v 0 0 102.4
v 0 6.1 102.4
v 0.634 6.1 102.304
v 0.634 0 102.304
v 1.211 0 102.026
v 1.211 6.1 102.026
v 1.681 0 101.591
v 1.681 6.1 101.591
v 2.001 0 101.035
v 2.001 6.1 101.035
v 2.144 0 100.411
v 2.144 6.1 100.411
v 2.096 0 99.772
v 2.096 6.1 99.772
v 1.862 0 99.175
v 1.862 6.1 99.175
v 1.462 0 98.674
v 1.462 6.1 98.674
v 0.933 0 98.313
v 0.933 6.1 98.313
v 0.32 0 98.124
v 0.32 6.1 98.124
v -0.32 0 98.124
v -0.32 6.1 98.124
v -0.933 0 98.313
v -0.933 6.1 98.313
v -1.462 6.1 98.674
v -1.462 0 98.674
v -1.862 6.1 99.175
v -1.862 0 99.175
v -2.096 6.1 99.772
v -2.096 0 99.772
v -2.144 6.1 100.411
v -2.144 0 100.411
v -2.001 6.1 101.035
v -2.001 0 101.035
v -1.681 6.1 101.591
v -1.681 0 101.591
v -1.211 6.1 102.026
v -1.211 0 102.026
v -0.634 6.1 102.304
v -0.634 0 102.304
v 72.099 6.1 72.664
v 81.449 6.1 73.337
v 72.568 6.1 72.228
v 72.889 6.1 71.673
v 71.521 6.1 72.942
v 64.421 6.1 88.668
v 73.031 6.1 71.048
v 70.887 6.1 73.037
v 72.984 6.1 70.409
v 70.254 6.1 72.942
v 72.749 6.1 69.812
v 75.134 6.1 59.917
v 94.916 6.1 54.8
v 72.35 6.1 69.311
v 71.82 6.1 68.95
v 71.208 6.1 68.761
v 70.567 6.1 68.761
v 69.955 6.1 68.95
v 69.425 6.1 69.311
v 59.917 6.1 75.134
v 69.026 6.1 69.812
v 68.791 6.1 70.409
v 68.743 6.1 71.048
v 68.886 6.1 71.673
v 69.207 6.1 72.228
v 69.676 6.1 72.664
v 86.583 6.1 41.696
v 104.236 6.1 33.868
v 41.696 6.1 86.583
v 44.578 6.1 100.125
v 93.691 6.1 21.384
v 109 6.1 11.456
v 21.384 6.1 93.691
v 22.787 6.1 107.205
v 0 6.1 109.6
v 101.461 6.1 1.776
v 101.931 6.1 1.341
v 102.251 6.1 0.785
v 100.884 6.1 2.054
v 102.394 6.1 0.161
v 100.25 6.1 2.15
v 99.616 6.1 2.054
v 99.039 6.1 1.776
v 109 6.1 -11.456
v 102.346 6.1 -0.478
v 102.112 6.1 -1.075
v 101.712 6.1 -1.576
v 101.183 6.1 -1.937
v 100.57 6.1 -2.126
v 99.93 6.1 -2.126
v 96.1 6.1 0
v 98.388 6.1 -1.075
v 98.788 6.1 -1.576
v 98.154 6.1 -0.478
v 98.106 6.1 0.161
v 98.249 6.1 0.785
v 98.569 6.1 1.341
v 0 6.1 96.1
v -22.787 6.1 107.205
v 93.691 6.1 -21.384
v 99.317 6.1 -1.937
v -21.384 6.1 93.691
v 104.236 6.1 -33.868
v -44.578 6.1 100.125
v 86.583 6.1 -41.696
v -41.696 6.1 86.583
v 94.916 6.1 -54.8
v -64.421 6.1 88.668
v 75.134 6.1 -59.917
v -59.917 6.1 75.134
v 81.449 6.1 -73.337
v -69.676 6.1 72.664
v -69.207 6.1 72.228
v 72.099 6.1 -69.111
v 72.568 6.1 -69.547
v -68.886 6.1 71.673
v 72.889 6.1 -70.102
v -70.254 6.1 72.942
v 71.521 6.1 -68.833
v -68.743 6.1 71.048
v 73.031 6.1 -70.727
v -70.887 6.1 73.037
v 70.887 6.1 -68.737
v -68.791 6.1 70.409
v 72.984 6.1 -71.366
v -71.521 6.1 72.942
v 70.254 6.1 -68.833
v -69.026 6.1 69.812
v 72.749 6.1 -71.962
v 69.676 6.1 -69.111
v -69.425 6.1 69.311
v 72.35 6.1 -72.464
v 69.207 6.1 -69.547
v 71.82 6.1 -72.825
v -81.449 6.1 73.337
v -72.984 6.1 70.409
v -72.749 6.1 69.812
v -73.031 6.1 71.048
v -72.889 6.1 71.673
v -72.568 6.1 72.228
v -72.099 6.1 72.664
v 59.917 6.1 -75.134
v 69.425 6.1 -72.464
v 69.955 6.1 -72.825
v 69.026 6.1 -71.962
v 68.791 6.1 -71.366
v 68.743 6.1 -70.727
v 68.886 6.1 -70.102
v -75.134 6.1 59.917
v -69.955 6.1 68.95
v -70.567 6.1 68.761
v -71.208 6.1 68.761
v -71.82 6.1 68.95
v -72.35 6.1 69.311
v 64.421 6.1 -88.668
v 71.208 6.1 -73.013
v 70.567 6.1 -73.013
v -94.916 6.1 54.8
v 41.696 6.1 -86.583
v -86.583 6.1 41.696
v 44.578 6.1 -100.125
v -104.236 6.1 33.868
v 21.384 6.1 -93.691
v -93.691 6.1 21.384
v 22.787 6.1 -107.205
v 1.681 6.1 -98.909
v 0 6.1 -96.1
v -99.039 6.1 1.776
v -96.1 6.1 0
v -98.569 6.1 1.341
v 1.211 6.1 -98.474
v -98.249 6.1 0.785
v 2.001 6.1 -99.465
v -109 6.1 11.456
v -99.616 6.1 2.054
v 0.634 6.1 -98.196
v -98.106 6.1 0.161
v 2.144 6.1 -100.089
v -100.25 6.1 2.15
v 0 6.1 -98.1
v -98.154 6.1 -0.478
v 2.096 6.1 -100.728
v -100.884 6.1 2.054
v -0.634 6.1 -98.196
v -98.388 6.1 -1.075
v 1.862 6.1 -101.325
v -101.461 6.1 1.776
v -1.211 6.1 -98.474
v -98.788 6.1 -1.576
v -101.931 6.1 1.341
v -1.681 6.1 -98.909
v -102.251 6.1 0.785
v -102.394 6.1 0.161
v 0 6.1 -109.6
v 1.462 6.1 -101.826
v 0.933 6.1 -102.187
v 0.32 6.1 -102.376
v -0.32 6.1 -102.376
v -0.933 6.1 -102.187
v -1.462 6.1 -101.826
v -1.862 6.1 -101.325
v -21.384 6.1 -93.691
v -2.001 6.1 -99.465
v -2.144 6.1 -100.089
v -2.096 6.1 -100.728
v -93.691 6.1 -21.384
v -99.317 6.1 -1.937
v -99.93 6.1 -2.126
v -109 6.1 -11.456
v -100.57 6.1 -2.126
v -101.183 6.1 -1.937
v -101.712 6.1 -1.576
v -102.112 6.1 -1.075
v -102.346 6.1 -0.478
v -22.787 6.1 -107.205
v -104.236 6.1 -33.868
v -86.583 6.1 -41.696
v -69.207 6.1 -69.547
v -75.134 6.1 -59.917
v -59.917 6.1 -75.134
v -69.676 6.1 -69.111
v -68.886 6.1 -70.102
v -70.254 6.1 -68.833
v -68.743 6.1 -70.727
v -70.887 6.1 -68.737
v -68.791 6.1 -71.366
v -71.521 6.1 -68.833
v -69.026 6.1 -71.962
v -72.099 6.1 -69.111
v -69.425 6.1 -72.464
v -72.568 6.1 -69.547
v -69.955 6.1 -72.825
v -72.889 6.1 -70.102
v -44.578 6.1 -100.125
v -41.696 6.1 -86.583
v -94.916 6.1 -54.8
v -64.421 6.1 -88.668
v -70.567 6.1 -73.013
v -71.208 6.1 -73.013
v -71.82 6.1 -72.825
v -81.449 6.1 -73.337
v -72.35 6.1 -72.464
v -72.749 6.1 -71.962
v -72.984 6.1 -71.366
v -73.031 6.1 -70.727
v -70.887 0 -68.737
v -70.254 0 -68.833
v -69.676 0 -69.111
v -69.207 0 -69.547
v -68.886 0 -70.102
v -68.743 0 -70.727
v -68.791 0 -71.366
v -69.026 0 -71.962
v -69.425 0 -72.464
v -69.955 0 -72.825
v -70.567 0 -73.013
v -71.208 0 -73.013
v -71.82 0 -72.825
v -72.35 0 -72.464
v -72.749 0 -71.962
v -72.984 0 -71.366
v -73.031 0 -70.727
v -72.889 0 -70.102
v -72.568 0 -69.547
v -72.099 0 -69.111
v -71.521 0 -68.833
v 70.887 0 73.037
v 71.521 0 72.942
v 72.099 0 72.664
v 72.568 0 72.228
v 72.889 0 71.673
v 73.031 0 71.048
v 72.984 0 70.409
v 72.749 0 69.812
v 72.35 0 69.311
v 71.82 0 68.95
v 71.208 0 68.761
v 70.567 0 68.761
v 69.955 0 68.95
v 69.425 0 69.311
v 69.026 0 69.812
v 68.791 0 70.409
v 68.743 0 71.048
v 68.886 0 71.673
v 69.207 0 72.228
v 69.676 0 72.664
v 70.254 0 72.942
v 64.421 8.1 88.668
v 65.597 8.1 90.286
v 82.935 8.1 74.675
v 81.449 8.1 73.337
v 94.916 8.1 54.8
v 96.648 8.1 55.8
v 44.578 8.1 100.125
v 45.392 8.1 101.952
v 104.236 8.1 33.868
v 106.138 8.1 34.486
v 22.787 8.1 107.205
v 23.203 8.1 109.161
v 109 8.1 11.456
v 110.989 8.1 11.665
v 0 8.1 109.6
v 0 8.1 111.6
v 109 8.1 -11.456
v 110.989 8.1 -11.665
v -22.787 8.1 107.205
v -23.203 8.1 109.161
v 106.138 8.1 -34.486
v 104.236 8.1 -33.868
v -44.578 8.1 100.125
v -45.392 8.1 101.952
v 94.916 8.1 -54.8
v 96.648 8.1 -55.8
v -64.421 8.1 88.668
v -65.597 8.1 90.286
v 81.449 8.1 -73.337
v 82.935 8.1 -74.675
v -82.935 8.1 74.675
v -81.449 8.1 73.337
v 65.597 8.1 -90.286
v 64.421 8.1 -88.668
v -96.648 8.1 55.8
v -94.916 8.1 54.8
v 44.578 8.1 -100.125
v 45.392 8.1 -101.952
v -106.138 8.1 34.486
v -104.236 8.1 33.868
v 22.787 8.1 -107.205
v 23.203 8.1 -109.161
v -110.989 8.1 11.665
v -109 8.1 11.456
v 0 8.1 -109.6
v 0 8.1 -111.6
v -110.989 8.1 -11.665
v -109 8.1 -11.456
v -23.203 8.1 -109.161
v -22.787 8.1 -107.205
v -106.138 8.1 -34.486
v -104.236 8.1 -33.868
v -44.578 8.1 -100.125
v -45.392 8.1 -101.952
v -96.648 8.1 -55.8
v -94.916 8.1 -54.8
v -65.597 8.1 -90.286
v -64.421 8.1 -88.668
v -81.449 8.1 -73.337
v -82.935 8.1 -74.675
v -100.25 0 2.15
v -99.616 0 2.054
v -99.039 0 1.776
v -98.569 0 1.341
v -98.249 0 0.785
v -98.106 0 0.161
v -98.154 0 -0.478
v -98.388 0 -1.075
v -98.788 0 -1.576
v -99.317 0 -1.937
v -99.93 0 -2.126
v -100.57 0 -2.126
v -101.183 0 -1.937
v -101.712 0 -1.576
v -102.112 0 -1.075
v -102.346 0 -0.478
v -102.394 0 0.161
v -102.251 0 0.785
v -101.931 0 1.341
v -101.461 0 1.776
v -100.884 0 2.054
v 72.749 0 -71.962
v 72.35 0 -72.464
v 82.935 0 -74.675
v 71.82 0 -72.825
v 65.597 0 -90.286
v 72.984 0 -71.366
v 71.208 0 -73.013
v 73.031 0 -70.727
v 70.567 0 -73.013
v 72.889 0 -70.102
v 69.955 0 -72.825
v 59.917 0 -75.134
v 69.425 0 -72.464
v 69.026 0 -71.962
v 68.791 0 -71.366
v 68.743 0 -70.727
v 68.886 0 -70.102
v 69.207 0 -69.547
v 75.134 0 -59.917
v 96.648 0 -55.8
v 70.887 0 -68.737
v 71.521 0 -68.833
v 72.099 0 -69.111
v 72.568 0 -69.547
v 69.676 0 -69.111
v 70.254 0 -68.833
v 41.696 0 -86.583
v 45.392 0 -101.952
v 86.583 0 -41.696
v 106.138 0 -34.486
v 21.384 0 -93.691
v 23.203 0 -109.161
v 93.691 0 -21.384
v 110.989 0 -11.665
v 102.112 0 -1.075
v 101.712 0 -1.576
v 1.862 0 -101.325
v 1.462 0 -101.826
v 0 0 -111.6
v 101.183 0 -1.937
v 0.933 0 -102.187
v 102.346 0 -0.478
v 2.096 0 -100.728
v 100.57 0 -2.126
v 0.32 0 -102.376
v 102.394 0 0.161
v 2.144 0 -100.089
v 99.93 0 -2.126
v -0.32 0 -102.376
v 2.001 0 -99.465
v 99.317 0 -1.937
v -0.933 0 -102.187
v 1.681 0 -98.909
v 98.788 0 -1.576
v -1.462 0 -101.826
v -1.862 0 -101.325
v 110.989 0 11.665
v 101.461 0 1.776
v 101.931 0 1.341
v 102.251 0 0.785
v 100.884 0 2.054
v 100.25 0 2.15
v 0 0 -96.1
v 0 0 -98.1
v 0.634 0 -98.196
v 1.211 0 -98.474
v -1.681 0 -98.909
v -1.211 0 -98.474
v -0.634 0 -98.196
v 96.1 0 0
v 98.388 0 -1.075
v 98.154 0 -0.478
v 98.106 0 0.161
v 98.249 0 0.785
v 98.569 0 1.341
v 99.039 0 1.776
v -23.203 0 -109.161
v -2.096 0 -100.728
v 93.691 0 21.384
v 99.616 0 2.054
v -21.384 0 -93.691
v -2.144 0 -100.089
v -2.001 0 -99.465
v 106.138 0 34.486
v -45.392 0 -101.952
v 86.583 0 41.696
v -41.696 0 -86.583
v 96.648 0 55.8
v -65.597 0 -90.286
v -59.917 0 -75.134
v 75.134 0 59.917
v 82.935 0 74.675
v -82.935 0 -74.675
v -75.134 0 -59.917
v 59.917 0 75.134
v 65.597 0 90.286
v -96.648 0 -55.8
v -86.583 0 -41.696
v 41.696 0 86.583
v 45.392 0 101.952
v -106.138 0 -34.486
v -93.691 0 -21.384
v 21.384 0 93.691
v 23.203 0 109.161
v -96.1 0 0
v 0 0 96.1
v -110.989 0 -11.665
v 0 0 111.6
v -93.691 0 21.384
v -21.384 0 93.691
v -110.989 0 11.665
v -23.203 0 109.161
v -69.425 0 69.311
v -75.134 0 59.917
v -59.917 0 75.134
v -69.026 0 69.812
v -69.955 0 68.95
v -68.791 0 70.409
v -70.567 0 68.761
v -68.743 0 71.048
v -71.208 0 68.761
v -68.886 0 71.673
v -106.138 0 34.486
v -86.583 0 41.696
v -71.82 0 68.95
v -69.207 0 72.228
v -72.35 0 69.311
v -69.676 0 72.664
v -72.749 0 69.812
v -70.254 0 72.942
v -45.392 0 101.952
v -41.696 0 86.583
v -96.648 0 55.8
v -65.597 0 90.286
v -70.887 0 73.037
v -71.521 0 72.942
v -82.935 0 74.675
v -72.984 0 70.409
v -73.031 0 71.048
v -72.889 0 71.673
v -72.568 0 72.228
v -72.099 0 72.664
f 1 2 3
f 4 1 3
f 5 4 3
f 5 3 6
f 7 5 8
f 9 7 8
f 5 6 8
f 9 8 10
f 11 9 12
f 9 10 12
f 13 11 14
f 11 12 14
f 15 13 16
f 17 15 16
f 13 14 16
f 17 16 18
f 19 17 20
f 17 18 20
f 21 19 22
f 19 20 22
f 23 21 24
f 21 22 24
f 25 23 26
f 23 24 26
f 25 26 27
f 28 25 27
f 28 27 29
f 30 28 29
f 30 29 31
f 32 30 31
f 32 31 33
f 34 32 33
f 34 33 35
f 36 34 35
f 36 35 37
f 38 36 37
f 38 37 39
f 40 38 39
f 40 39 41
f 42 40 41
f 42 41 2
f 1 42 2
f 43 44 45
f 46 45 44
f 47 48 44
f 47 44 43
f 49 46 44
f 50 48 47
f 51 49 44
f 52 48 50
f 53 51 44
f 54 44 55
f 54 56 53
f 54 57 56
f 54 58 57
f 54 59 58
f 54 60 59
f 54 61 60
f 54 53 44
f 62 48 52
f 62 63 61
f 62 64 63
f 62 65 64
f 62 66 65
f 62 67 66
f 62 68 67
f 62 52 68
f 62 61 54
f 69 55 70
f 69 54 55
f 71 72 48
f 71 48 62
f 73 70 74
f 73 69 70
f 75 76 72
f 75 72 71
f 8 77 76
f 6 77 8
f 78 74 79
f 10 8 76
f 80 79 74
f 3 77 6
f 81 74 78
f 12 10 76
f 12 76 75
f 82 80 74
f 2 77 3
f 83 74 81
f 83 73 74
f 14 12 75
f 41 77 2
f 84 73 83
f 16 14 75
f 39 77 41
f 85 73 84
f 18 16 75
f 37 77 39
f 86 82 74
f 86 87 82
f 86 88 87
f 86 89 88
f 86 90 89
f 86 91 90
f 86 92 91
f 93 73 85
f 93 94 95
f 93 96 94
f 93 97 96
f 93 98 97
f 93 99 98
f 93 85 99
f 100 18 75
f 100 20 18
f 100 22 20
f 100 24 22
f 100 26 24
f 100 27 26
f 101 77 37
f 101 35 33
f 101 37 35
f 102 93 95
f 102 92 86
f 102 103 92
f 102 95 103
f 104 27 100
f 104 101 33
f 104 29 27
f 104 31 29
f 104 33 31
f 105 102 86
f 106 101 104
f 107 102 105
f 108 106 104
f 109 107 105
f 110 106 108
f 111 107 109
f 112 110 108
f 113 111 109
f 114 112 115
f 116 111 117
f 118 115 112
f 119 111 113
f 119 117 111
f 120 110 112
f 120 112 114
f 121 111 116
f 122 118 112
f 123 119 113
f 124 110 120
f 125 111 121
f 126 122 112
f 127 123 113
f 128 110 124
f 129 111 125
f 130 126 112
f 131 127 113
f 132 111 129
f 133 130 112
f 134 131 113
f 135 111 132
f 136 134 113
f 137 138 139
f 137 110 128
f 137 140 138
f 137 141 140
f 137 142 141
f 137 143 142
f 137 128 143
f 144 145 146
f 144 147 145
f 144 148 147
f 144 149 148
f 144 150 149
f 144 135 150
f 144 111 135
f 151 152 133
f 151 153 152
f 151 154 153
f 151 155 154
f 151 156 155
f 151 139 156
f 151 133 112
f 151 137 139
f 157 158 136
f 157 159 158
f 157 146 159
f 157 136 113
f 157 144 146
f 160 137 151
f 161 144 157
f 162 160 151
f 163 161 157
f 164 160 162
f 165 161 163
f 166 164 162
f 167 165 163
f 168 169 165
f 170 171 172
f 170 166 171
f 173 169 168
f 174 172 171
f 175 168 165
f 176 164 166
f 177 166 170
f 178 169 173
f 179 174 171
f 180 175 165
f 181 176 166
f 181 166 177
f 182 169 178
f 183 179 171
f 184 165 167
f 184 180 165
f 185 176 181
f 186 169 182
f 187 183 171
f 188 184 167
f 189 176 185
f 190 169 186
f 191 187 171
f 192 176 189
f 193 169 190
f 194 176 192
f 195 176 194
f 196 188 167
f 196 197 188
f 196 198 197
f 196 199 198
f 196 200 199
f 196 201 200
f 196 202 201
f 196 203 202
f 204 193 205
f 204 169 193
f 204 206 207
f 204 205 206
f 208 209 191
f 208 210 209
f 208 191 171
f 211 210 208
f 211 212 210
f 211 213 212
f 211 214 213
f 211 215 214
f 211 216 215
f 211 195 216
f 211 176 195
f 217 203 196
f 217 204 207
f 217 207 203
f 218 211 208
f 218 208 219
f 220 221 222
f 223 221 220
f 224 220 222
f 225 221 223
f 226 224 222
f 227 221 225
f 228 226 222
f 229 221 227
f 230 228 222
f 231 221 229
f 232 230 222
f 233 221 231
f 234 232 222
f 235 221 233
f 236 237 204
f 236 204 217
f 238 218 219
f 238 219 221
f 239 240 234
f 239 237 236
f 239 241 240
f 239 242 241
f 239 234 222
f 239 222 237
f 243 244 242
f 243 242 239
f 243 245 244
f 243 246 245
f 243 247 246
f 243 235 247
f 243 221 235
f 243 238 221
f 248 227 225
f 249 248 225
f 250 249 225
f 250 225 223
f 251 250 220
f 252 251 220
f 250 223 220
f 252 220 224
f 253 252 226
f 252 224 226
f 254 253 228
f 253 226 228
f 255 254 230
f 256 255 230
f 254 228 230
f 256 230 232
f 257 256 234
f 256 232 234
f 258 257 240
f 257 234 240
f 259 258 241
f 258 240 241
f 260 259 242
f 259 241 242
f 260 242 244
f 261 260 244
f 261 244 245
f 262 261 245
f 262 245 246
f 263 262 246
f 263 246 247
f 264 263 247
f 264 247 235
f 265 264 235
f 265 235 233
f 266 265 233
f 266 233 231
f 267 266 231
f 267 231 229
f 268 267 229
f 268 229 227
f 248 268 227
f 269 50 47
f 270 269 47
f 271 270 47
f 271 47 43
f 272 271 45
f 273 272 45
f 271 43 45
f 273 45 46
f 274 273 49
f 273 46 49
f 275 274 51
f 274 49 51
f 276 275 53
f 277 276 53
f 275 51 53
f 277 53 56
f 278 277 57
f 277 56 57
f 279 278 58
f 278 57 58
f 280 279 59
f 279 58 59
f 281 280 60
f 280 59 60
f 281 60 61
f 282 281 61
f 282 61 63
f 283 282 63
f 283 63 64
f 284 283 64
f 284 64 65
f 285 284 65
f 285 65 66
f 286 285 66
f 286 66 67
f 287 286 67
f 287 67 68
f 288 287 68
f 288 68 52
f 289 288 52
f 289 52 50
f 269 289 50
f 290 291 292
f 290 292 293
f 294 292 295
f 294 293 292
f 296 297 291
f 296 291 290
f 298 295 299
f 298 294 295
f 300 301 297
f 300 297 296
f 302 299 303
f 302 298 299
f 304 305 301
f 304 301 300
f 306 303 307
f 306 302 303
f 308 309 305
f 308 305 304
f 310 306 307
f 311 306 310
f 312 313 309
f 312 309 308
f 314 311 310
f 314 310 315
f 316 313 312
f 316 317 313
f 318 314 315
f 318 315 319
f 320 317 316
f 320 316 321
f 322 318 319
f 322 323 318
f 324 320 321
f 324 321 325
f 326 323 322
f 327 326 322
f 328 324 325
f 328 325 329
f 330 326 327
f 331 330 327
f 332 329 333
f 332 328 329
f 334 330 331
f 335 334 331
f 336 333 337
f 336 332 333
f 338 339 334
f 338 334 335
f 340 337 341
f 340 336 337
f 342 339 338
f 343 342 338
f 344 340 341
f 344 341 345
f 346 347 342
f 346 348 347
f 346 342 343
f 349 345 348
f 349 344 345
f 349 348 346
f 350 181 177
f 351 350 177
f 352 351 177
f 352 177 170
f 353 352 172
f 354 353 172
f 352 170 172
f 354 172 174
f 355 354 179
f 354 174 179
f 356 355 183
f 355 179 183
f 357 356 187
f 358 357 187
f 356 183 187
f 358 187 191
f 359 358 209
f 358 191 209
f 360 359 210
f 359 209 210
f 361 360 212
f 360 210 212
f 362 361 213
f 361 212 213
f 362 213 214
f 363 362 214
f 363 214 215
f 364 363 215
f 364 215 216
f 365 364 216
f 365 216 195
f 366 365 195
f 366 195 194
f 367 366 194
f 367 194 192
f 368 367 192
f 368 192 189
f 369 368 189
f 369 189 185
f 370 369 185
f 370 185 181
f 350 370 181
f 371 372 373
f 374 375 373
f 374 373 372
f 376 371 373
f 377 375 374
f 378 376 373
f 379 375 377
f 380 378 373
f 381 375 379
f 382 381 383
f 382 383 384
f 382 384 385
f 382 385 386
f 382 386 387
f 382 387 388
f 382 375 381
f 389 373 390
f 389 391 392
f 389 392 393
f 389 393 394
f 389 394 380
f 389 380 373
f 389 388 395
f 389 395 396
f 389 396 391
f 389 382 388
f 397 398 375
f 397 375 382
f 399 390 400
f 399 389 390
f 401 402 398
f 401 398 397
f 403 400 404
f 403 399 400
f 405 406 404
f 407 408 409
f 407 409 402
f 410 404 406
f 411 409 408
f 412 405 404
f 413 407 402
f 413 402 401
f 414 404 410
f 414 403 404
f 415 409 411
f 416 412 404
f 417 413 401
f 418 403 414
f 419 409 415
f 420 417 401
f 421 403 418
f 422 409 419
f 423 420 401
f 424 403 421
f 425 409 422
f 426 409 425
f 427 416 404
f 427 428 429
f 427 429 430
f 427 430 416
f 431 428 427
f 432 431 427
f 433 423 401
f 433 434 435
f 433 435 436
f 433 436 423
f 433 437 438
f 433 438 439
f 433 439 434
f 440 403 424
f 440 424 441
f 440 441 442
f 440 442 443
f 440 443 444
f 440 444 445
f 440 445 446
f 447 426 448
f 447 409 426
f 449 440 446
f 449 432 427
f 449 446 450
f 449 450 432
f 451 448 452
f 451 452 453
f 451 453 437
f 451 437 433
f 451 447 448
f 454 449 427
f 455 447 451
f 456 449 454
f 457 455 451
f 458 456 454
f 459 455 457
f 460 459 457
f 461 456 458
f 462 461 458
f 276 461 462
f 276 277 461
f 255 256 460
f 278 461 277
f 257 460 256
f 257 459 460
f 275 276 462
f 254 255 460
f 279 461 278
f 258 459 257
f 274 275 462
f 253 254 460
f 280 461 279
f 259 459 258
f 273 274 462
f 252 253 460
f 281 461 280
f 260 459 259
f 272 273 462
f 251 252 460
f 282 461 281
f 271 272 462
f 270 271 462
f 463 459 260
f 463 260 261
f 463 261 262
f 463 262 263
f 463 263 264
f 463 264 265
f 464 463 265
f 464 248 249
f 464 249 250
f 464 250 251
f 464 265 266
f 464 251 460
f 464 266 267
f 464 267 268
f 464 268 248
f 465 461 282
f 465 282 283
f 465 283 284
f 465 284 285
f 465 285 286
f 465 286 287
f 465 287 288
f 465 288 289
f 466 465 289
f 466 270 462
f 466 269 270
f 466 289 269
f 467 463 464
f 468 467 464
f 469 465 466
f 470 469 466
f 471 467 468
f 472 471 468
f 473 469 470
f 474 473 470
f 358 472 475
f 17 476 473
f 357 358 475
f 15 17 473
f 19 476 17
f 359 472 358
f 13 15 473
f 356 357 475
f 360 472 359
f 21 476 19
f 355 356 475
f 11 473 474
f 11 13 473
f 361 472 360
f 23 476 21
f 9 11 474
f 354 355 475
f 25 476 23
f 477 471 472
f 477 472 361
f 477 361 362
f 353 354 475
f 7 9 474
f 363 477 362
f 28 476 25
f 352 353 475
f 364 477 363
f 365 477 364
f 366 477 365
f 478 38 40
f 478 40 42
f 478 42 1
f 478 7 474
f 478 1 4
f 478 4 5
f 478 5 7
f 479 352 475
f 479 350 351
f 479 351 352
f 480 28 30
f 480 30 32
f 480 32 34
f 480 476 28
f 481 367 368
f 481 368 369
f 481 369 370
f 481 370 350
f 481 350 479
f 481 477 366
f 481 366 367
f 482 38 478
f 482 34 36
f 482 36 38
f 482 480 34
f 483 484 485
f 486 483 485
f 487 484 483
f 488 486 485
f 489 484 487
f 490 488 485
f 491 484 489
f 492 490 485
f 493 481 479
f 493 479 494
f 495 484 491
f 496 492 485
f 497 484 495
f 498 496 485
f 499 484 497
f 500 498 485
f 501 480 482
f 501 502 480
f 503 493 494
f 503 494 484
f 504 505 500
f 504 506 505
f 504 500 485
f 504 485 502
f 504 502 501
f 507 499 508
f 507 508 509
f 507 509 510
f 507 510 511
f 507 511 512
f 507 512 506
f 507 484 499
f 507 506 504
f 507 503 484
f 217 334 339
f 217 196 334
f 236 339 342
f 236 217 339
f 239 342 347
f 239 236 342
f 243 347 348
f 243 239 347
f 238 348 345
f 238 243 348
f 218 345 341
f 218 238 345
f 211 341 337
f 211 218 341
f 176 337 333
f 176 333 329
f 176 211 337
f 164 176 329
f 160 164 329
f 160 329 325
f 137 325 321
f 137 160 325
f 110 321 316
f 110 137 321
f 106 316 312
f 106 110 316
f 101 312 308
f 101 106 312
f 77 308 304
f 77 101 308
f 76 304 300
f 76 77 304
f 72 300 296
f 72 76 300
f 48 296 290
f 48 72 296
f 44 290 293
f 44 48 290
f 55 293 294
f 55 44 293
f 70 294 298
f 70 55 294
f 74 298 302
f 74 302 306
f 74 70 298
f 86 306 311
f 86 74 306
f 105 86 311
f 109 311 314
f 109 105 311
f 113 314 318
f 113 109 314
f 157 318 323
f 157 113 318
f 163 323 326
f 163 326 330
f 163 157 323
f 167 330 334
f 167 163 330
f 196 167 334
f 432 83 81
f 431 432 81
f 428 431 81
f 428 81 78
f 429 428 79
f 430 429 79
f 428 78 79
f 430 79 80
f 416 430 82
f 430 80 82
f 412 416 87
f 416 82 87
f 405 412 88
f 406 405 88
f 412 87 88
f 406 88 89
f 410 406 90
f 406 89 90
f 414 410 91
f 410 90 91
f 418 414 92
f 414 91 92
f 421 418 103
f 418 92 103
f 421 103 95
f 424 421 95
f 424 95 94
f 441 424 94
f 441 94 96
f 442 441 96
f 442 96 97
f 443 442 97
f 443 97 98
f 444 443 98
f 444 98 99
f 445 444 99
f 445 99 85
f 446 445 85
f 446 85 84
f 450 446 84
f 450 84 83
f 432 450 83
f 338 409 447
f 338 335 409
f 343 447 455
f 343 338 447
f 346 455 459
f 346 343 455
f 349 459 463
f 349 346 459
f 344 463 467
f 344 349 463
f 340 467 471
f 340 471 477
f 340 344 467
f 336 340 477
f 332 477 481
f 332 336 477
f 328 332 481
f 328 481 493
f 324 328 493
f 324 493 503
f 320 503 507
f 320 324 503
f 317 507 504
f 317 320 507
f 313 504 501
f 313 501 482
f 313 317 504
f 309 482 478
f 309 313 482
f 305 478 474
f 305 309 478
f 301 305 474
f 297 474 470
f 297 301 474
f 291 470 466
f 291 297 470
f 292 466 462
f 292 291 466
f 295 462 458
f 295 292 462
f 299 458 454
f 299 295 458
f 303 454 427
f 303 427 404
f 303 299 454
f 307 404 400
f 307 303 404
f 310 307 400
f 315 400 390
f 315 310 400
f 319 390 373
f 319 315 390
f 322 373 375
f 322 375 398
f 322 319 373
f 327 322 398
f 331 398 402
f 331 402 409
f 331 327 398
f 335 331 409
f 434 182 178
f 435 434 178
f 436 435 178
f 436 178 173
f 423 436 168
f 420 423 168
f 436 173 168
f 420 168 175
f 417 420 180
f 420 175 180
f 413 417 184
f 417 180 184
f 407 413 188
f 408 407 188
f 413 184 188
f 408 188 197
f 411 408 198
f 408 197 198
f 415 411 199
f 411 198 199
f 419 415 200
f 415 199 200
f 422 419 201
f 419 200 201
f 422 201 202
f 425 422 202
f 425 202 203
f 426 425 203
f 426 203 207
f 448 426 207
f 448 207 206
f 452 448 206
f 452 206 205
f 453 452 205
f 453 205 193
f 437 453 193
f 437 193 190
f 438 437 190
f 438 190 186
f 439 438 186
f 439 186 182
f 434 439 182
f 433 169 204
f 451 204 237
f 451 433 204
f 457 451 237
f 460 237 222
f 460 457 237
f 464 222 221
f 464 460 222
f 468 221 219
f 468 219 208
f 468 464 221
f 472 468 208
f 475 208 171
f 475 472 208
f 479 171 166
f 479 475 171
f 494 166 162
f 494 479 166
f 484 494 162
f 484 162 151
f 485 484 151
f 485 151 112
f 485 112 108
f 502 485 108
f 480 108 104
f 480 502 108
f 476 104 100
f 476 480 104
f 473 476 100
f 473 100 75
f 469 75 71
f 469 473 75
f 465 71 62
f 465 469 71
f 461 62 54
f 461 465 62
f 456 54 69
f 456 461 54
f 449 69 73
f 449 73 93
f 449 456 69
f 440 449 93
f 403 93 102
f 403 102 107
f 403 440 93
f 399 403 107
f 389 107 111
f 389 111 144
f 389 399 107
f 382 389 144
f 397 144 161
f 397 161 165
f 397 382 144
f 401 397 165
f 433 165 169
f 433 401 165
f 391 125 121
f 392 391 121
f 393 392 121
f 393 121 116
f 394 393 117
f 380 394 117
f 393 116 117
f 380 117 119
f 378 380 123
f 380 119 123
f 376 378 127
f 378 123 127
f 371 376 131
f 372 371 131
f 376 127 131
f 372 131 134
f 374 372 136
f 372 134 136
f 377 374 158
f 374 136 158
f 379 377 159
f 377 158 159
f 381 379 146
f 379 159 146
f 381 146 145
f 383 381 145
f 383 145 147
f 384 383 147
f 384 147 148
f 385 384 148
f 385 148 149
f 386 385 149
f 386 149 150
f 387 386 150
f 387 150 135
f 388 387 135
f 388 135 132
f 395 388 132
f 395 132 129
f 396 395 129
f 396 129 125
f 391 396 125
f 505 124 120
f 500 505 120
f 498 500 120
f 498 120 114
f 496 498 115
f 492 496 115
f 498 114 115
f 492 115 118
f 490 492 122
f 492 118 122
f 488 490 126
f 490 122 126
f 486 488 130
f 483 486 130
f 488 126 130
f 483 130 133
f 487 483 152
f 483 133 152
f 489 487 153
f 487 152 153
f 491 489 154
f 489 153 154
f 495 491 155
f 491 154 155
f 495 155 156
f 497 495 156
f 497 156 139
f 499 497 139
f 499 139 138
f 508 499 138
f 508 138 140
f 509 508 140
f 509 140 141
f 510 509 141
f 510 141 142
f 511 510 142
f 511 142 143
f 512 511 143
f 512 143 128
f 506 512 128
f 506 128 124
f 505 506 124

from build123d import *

# Parameters (mm, degrees)
CUT_EXTRUDE_1_REACH = 159.944
SKETCH_2_R          = 2.15


with BuildPart() as part:
    # 草图1 → 旋转1 (revolve)
    with BuildSketch(Plane.XY, mode=Mode.PRIVATE) as revolve_1_sk:
        Polygon((111.6, 6.1), (111.6, 8.1), (109.6, 8.1), (109.6, 6.1), (96.1, 6.1), (96.1, 0), (111.6, 0), align=None)
    revolve(revolve_1_sk.sketch.rotate(Axis((0, 0, 0), (0, 1, 0)), 90), axis=Axis((0, 0, 0), (0, 1, 0)))

    # 草图2 → 切除-拉伸1 (cut, up to next)
    with BuildSketch(Plane(origin=(0, 6.1, 0), x_dir=(1, 0, 0), z_dir=(0, 1, 0)), mode=Mode.PRIVATE) as cut_extrude_1_sk1:
        with Locations(Location((-100.25, 0, 0), (0, 0, 270))):
            Circle(SKETCH_2_R)
    cut_extrude_1_tool1 = extrude(cut_extrude_1_sk1.sketch, amount=-CUT_EXTRUDE_1_REACH, mode=Mode.PRIVATE) & part.part
    # 草图2 → 切除-拉伸1 (cut, up to next)
    with BuildSketch(Plane(origin=(0, 6.1, 0), x_dir=(1, 0, 0), z_dir=(0, 1, 0)), mode=Mode.PRIVATE) as cut_extrude_1_sk2:
        with Locations(Location((-70.887454814, 70.887454814, 0), (0, 0, 270))):
            Circle(SKETCH_2_R)
    cut_extrude_1_tool2 = extrude(cut_extrude_1_sk2.sketch, amount=-CUT_EXTRUDE_1_REACH, mode=Mode.PRIVATE) & part.part
    # 草图2 → 切除-拉伸1 (cut, up to next)
    with BuildSketch(Plane(origin=(0, 6.1, 0), x_dir=(1, 0, 0), z_dir=(0, 1, 0)), mode=Mode.PRIVATE) as cut_extrude_1_sk3:
        with Locations(Location((0, 100.25, 0), (0, 0, 270))):
            Circle(SKETCH_2_R)
    cut_extrude_1_tool3 = extrude(cut_extrude_1_sk3.sketch, amount=-CUT_EXTRUDE_1_REACH, mode=Mode.PRIVATE) & part.part
    # 草图2 → 切除-拉伸1 (cut, up to next)
    with BuildSketch(Plane(origin=(0, 6.1, 0), x_dir=(1, 0, 0), z_dir=(0, 1, 0)), mode=Mode.PRIVATE) as cut_extrude_1_sk4:
        with Locations(Location((70.887454814, 70.887454814, 0), (0, 0, 270))):
            Circle(SKETCH_2_R)
    cut_extrude_1_tool4 = extrude(cut_extrude_1_sk4.sketch, amount=-CUT_EXTRUDE_1_REACH, mode=Mode.PRIVATE) & part.part
    # 草图2 → 切除-拉伸1 (cut, up to next)
    with BuildSketch(Plane(origin=(0, 6.1, 0), x_dir=(1, 0, 0), z_dir=(0, 1, 0)), mode=Mode.PRIVATE) as cut_extrude_1_sk5:
        with Locations(Location((100.25, 0, 0), (0, 0, 270))):
            Circle(SKETCH_2_R)
    cut_extrude_1_tool5 = extrude(cut_extrude_1_sk5.sketch, amount=-CUT_EXTRUDE_1_REACH, mode=Mode.PRIVATE) & part.part
    # 草图2 → 切除-拉伸1 (cut, up to next)
    with BuildSketch(Plane(origin=(0, 6.1, 0), x_dir=(1, 0, 0), z_dir=(0, 1, 0)), mode=Mode.PRIVATE) as cut_extrude_1_sk6:
        with Locations(Location((70.887454814, -70.887454814, 0), (0, 0, 270))):
            Circle(SKETCH_2_R)
    cut_extrude_1_tool6 = extrude(cut_extrude_1_sk6.sketch, amount=-CUT_EXTRUDE_1_REACH, mode=Mode.PRIVATE) & part.part
    # 草图2 → 切除-拉伸1 (cut, up to next)
    with BuildSketch(Plane(origin=(0, 6.1, 0), x_dir=(1, 0, 0), z_dir=(0, 1, 0)), mode=Mode.PRIVATE) as cut_extrude_1_sk7:
        with Locations(Location((0, -100.25, 0), (0, 0, 270))):
            Circle(SKETCH_2_R)
    cut_extrude_1_tool7 = extrude(cut_extrude_1_sk7.sketch, amount=-CUT_EXTRUDE_1_REACH, mode=Mode.PRIVATE) & part.part
    # 草图2 → 切除-拉伸1 (cut, up to next)
    with BuildSketch(Plane(origin=(0, 6.1, 0), x_dir=(1, 0, 0), z_dir=(0, 1, 0)), mode=Mode.PRIVATE) as cut_extrude_1_sk8:
        with Locations(Location((-70.887454814, -70.887454814, 0), (0, 0, 270))):
            Circle(SKETCH_2_R)
    cut_extrude_1_tool8 = extrude(cut_extrude_1_sk8.sketch, amount=-CUT_EXTRUDE_1_REACH, mode=Mode.PRIVATE) & part.part
    add(cut_extrude_1_tool1.solids().sort_by_distance((-100.25, 6.1, 0))[0], mode=Mode.SUBTRACT)
    add(cut_extrude_1_tool2.solids().sort_by_distance((-70.887455, 6.1, -70.887455))[0], mode=Mode.SUBTRACT)
    add(cut_extrude_1_tool3.solids().sort_by_distance((0, 6.1, -100.25))[0], mode=Mode.SUBTRACT)
    add(cut_extrude_1_tool4.solids().sort_by_distance((70.887455, 6.1, -70.887455))[0], mode=Mode.SUBTRACT)
    add(cut_extrude_1_tool5.solids().sort_by_distance((100.25, 6.1, 0))[0], mode=Mode.SUBTRACT)
    add(cut_extrude_1_tool6.solids().sort_by_distance((70.887455, 6.1, 70.887455))[0], mode=Mode.SUBTRACT)
    add(cut_extrude_1_tool7.solids().sort_by_distance((0, 6.1, 100.25))[0], mode=Mode.SUBTRACT)
    add(cut_extrude_1_tool8.solids().sort_by_distance((-70.887455, 6.1, 70.887455))[0], mode=Mode.SUBTRACT)


solid = part.part
